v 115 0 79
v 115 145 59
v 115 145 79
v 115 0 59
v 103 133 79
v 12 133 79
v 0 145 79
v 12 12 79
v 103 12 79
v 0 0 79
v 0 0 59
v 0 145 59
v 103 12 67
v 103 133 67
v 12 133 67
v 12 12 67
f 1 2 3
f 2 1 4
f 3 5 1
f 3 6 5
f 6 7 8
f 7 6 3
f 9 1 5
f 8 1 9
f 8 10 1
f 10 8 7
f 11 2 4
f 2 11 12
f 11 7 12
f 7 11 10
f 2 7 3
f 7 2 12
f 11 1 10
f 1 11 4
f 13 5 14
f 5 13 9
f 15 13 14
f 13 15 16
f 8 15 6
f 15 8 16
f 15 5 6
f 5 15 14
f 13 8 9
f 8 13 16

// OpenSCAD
// width = 145;
width = 115;
length = 145;
height = 20;

table_height = 79;

border_width = 12;
// border_width = 20;
// border_width = 25;

inset_width = width - border_width * 2;
inset_length = length - border_width * 2;
inset_depth = 12;
bleed = 1;

echo("Play width: ", inset_width);
echo("Play length: ", inset_length);

translate([0, 0, table_height - height]) {
  difference() {
    cube([width, length, height]);

    translate([border_width, border_width, height - inset_depth]) {
      cube([inset_width, inset_length, inset_depth + bleed]);
    }
  }
}
